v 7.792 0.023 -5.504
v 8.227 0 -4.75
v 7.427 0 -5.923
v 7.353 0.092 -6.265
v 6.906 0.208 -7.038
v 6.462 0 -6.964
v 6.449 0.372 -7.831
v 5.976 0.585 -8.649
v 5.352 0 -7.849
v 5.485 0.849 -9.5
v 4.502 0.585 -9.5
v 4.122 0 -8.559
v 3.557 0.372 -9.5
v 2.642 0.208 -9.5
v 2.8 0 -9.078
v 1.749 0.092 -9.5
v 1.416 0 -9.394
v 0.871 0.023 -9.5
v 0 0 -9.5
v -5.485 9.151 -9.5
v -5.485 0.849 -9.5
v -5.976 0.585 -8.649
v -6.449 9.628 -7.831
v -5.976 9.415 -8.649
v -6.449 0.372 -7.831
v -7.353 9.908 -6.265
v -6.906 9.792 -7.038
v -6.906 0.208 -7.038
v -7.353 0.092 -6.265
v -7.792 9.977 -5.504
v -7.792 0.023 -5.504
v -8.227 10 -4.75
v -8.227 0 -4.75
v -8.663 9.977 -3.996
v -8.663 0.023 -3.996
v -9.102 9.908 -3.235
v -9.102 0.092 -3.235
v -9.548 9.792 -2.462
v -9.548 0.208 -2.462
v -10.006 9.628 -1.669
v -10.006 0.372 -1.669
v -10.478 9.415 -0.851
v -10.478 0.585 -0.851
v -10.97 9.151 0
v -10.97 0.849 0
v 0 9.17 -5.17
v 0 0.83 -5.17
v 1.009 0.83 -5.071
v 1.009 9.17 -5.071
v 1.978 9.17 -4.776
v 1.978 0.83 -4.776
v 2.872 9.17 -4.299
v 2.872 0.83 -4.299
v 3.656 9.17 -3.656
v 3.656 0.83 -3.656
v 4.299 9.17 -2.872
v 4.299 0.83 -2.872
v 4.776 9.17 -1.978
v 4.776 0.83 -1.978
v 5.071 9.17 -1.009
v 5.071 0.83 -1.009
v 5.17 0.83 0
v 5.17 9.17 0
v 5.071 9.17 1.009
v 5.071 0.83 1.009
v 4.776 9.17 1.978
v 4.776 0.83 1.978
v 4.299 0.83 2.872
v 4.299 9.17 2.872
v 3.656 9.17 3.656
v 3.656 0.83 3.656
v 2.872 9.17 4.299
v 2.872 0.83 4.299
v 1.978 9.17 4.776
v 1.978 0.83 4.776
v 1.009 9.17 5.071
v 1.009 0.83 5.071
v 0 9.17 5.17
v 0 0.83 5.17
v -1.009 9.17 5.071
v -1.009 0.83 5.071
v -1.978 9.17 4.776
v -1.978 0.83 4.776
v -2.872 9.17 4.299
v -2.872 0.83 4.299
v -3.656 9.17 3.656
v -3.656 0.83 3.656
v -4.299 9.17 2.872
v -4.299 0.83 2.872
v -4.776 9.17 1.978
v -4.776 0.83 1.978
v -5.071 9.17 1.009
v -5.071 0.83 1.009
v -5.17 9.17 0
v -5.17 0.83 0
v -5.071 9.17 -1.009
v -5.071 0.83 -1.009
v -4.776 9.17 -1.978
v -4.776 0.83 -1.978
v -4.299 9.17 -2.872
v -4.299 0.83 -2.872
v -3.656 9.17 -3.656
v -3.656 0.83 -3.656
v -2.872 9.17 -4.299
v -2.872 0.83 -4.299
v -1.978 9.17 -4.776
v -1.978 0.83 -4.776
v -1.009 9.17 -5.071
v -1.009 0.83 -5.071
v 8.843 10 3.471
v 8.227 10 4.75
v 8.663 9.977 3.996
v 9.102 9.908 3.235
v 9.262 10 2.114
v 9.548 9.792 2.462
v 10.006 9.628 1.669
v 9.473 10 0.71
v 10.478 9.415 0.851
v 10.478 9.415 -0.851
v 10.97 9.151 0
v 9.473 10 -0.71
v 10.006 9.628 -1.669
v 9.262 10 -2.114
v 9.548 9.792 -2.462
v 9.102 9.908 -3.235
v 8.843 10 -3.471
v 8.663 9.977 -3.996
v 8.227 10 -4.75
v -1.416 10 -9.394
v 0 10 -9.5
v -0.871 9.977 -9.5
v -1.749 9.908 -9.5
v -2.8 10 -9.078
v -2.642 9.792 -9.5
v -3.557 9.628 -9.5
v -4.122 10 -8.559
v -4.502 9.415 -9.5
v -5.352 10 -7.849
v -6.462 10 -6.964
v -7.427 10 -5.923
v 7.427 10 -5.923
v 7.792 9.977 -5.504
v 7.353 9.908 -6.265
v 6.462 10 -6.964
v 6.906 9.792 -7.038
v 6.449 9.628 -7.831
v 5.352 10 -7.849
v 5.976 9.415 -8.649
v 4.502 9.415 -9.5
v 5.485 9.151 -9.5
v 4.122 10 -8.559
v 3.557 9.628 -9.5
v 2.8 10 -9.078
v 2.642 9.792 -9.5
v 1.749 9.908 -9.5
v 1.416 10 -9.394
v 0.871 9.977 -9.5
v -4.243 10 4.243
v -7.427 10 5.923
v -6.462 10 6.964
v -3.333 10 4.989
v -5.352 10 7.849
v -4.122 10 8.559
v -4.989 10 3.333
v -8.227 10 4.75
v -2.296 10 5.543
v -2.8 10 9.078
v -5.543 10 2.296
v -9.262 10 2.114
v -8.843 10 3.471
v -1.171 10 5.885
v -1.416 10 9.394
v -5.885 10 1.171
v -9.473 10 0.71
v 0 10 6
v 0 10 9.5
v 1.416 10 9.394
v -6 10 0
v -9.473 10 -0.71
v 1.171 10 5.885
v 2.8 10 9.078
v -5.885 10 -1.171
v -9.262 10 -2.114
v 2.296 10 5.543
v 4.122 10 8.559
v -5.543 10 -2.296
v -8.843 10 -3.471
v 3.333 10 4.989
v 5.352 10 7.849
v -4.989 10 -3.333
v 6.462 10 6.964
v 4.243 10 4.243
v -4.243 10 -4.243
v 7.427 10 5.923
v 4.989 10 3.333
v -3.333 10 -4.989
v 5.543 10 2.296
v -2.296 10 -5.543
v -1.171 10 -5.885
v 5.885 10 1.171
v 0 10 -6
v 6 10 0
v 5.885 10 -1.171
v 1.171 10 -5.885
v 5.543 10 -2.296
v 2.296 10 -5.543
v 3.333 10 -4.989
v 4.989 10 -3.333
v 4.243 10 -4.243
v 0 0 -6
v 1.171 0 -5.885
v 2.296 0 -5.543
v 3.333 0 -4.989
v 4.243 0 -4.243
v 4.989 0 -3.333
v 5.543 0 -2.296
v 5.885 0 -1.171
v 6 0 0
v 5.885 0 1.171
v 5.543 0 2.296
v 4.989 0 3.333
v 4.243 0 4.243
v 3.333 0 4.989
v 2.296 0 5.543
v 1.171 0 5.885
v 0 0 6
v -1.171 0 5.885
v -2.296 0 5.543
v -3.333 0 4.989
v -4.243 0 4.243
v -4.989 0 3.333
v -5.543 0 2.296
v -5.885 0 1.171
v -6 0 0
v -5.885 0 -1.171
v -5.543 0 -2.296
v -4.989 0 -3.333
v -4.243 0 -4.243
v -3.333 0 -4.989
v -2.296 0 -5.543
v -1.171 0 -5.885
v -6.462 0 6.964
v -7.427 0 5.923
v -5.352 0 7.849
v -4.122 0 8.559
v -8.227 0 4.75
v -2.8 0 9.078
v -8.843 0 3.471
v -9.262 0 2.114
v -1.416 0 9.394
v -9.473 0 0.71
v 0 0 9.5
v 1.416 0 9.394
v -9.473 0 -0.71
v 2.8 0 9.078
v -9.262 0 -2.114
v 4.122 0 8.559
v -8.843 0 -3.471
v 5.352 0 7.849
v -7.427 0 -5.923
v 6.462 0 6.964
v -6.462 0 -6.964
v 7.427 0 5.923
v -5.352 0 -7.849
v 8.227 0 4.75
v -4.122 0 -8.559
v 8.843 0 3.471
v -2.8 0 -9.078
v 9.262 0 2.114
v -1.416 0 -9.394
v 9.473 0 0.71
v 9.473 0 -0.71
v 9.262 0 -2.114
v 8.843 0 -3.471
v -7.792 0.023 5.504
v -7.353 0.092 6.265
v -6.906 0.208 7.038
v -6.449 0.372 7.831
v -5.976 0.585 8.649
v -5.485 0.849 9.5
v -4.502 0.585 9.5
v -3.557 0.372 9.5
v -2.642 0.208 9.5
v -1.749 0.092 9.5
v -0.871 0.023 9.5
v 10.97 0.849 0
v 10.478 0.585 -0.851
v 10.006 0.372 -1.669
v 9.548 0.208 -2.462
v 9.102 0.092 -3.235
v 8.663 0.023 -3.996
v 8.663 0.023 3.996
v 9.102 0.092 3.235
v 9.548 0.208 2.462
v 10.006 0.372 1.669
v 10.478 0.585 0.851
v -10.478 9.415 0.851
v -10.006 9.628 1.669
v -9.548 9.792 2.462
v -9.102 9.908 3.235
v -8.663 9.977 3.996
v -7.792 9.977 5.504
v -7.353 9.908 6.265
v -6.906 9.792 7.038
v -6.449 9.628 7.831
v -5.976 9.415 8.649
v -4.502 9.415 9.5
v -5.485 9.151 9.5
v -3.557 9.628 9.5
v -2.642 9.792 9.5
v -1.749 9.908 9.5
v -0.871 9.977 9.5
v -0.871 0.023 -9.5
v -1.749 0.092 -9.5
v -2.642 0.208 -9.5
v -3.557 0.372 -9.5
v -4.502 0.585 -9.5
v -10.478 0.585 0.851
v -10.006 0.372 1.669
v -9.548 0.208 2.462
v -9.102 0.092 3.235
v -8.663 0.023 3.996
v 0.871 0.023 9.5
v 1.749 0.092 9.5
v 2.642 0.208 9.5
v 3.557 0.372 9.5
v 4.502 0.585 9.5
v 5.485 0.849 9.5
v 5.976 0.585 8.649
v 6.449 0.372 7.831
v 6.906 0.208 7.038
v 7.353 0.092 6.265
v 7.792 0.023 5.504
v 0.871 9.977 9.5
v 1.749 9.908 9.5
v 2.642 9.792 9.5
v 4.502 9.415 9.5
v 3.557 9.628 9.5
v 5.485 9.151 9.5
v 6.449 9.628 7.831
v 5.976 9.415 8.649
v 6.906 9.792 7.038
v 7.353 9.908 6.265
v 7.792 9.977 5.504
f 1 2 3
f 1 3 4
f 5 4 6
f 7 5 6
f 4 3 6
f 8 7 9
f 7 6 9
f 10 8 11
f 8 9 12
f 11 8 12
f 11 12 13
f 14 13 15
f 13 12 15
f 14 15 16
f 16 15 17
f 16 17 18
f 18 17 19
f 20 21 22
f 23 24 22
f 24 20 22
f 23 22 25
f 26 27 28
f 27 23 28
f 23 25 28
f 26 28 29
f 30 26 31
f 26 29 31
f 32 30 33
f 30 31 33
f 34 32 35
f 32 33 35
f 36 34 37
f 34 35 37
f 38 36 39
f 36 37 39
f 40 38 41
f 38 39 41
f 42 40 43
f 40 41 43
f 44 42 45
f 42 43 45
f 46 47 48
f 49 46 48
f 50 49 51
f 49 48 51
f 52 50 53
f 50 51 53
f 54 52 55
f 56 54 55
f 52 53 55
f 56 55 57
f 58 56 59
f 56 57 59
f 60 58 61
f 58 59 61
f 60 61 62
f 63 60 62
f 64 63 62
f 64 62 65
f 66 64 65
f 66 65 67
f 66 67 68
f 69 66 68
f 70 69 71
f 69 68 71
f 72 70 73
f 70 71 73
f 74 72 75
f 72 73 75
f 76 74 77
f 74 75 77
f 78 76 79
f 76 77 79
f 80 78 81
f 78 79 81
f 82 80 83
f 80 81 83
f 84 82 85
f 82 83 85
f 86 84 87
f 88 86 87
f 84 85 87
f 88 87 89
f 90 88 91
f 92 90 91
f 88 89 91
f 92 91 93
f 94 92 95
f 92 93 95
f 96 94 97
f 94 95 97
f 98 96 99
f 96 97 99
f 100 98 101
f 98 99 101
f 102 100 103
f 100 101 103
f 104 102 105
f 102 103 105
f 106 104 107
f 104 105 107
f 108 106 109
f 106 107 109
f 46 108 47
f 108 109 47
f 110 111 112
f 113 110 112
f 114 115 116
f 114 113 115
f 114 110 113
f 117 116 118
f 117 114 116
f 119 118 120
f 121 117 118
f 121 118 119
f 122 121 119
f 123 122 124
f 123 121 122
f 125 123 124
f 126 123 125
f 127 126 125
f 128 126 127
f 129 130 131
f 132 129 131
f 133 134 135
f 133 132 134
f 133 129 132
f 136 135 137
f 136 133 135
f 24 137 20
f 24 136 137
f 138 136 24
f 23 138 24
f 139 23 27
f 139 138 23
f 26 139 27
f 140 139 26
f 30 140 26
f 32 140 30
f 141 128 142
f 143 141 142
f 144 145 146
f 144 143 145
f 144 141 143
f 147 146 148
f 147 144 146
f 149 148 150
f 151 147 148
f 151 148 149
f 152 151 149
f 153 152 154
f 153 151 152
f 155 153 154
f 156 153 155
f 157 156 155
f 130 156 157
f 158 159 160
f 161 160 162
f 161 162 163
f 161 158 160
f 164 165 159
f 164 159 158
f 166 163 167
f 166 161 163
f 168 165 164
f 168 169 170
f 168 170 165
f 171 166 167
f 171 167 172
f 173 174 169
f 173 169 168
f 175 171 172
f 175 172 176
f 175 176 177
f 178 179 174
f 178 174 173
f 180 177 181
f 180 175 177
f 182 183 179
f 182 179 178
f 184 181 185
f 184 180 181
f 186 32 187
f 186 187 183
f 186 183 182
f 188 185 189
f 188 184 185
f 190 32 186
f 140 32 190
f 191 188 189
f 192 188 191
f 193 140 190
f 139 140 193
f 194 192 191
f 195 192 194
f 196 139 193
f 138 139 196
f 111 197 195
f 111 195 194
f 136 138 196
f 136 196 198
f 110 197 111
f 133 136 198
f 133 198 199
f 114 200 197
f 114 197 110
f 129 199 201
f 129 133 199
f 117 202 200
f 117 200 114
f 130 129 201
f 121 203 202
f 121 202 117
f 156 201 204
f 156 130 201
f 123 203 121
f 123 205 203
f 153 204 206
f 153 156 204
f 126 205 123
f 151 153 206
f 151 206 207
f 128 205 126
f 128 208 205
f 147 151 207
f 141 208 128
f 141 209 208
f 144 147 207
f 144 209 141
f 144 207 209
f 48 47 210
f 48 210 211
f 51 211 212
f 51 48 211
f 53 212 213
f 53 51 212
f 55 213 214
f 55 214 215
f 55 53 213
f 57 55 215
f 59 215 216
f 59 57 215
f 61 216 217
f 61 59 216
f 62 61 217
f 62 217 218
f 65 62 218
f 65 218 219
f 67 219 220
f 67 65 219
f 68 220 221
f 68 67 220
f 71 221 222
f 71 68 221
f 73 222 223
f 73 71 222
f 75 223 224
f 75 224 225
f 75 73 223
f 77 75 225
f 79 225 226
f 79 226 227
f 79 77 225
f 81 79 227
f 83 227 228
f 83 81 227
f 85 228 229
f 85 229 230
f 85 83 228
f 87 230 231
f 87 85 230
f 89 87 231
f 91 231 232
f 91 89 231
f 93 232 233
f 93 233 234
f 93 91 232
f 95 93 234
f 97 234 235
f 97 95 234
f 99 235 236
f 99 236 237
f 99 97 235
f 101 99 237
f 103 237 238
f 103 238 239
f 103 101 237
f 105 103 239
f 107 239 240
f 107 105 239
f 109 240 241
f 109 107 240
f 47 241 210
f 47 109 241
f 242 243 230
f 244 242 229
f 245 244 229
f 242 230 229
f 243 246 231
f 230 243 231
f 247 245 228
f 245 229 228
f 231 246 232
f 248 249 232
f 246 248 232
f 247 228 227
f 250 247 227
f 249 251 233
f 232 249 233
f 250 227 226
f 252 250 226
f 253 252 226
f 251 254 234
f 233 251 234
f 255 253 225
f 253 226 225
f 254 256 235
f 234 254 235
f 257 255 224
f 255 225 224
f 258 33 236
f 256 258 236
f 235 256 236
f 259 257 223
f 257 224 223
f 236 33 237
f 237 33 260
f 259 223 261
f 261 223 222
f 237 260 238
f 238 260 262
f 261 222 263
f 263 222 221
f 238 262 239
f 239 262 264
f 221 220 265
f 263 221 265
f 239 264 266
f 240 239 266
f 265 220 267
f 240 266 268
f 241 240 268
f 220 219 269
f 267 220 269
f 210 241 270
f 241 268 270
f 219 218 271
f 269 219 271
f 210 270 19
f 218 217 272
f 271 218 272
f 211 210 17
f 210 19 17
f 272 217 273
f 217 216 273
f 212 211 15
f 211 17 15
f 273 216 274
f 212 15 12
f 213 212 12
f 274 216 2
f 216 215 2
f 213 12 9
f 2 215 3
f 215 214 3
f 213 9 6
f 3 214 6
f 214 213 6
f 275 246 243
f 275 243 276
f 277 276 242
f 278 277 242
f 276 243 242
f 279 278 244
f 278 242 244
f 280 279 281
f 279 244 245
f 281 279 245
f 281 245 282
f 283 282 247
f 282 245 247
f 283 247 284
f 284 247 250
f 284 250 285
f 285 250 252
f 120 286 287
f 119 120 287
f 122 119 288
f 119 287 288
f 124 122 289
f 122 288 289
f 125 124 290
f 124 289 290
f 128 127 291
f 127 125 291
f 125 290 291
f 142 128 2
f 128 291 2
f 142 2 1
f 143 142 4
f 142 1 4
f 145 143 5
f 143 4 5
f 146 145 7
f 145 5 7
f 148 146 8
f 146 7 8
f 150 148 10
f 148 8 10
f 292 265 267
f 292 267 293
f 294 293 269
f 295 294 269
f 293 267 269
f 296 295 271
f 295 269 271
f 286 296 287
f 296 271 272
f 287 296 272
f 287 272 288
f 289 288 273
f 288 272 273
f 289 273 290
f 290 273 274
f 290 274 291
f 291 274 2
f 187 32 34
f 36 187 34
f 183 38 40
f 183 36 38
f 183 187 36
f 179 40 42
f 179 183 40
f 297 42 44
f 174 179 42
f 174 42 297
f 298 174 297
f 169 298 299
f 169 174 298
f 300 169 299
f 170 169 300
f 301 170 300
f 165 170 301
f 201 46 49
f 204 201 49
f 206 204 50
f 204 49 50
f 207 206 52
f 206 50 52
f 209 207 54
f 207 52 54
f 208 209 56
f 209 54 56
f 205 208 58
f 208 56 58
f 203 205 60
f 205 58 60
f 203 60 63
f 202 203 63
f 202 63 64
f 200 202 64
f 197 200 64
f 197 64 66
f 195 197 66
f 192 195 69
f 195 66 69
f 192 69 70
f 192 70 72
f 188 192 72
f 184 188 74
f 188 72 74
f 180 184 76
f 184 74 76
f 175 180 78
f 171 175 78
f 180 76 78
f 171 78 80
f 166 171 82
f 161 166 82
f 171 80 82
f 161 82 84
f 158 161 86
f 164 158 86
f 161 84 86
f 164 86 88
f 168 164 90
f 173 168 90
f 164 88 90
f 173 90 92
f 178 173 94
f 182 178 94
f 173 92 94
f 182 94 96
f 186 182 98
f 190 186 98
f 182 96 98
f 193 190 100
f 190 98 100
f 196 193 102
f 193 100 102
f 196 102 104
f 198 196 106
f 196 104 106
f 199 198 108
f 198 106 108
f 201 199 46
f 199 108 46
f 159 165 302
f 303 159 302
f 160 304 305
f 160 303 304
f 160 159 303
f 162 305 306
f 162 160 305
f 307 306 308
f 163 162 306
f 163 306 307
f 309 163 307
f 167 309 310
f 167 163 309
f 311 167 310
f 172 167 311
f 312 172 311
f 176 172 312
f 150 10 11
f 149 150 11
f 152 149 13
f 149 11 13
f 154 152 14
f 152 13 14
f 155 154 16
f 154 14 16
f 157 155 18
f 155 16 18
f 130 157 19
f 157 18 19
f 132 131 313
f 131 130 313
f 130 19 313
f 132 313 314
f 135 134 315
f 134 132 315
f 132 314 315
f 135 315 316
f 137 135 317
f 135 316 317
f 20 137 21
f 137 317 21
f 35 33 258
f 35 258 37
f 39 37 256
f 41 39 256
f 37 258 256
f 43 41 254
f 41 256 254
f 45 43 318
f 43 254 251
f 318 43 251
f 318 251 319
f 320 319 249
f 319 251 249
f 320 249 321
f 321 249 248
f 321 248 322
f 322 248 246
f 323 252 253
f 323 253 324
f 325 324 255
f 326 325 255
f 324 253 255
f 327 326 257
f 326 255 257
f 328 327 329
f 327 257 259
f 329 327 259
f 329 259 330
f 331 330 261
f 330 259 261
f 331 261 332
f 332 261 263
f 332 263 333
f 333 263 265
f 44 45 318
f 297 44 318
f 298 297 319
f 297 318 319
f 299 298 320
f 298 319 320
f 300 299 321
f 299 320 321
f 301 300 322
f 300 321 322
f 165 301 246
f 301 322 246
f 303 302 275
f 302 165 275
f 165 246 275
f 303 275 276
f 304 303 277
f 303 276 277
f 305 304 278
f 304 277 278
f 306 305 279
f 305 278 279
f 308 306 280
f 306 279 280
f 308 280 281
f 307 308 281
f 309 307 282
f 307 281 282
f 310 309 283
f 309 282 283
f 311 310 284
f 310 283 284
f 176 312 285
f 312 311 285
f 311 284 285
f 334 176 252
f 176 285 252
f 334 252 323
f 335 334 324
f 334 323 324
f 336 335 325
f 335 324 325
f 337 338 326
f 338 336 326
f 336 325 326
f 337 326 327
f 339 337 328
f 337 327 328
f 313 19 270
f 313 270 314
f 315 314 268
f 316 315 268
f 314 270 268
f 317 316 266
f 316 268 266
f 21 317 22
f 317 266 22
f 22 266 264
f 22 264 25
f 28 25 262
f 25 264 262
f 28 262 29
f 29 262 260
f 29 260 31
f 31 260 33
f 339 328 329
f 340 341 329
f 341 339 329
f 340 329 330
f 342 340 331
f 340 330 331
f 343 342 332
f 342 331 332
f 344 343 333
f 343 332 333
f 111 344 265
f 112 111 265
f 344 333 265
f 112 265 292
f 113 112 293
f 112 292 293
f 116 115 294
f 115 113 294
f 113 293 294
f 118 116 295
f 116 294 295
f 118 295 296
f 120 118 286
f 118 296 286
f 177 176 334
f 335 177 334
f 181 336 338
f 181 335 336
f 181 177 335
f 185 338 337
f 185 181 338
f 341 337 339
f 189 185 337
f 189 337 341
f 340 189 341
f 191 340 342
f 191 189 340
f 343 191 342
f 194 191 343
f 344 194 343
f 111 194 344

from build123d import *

# Parameters (mm, degrees)
EXTRUDE_1_DEPTH     = 10
SKETCH_4_R          = 5.17
CUT_EXTRUDE_1_DEPTH = 10
CHAMFER_1_SIZE      = 0.83


with BuildPart() as part:
    # Эскиз1 → Бобышка-Вытянуть1 (new body)
    with BuildSketch(Plane(origin=(0, 0, 0), x_dir=(1, 0, 0), z_dir=(0, 1, 0))):
        Polygon((-5.484827557, 9.5), (-10.969655115, 0), (-5.484827557, -9.5), (5.484827557, -9.5), (10.969655115, 0), (5.484827557, 9.5), align=None)
    extrude(amount=EXTRUDE_1_DEPTH)

    # Эскиз2 → Вырез-Повернуть1 (revolve, cut)
    with BuildSketch(Plane(origin=(0, 0, 0), x_dir=(0, 0, -1), z_dir=(1, 0, 0))):
        Polygon((-9.5, 10), (-10.97, 10), (-10.97, 9.151295104), align=None)
        Polygon((-9.5, 0), (-10.97, 0), (-10.97, 0.848704896), align=None)
    revolve(axis=Axis((0, -1000, 0), (0, 1, 0)), mode=Mode.SUBTRACT)

    # Эскиз4 → Вырез-Вытянуть1 (cut)
    with BuildSketch(Plane.XZ):
        with Locations(Location((0, 0, 0), (0, 0, 270))):
            Circle(SKETCH_4_R)
    extrude(amount=-CUT_EXTRUDE_1_DEPTH, mode=Mode.SUBTRACT)

    # Фаска1
    chamfer_1_edges = [part.edges().sort_by_distance(p)[0] for p in [
        (0, 10, 5.17),
        (0, 0, 5.17),
    ]]
    chamfer(chamfer_1_edges, length=CHAMFER_1_SIZE)


solid = part.part
